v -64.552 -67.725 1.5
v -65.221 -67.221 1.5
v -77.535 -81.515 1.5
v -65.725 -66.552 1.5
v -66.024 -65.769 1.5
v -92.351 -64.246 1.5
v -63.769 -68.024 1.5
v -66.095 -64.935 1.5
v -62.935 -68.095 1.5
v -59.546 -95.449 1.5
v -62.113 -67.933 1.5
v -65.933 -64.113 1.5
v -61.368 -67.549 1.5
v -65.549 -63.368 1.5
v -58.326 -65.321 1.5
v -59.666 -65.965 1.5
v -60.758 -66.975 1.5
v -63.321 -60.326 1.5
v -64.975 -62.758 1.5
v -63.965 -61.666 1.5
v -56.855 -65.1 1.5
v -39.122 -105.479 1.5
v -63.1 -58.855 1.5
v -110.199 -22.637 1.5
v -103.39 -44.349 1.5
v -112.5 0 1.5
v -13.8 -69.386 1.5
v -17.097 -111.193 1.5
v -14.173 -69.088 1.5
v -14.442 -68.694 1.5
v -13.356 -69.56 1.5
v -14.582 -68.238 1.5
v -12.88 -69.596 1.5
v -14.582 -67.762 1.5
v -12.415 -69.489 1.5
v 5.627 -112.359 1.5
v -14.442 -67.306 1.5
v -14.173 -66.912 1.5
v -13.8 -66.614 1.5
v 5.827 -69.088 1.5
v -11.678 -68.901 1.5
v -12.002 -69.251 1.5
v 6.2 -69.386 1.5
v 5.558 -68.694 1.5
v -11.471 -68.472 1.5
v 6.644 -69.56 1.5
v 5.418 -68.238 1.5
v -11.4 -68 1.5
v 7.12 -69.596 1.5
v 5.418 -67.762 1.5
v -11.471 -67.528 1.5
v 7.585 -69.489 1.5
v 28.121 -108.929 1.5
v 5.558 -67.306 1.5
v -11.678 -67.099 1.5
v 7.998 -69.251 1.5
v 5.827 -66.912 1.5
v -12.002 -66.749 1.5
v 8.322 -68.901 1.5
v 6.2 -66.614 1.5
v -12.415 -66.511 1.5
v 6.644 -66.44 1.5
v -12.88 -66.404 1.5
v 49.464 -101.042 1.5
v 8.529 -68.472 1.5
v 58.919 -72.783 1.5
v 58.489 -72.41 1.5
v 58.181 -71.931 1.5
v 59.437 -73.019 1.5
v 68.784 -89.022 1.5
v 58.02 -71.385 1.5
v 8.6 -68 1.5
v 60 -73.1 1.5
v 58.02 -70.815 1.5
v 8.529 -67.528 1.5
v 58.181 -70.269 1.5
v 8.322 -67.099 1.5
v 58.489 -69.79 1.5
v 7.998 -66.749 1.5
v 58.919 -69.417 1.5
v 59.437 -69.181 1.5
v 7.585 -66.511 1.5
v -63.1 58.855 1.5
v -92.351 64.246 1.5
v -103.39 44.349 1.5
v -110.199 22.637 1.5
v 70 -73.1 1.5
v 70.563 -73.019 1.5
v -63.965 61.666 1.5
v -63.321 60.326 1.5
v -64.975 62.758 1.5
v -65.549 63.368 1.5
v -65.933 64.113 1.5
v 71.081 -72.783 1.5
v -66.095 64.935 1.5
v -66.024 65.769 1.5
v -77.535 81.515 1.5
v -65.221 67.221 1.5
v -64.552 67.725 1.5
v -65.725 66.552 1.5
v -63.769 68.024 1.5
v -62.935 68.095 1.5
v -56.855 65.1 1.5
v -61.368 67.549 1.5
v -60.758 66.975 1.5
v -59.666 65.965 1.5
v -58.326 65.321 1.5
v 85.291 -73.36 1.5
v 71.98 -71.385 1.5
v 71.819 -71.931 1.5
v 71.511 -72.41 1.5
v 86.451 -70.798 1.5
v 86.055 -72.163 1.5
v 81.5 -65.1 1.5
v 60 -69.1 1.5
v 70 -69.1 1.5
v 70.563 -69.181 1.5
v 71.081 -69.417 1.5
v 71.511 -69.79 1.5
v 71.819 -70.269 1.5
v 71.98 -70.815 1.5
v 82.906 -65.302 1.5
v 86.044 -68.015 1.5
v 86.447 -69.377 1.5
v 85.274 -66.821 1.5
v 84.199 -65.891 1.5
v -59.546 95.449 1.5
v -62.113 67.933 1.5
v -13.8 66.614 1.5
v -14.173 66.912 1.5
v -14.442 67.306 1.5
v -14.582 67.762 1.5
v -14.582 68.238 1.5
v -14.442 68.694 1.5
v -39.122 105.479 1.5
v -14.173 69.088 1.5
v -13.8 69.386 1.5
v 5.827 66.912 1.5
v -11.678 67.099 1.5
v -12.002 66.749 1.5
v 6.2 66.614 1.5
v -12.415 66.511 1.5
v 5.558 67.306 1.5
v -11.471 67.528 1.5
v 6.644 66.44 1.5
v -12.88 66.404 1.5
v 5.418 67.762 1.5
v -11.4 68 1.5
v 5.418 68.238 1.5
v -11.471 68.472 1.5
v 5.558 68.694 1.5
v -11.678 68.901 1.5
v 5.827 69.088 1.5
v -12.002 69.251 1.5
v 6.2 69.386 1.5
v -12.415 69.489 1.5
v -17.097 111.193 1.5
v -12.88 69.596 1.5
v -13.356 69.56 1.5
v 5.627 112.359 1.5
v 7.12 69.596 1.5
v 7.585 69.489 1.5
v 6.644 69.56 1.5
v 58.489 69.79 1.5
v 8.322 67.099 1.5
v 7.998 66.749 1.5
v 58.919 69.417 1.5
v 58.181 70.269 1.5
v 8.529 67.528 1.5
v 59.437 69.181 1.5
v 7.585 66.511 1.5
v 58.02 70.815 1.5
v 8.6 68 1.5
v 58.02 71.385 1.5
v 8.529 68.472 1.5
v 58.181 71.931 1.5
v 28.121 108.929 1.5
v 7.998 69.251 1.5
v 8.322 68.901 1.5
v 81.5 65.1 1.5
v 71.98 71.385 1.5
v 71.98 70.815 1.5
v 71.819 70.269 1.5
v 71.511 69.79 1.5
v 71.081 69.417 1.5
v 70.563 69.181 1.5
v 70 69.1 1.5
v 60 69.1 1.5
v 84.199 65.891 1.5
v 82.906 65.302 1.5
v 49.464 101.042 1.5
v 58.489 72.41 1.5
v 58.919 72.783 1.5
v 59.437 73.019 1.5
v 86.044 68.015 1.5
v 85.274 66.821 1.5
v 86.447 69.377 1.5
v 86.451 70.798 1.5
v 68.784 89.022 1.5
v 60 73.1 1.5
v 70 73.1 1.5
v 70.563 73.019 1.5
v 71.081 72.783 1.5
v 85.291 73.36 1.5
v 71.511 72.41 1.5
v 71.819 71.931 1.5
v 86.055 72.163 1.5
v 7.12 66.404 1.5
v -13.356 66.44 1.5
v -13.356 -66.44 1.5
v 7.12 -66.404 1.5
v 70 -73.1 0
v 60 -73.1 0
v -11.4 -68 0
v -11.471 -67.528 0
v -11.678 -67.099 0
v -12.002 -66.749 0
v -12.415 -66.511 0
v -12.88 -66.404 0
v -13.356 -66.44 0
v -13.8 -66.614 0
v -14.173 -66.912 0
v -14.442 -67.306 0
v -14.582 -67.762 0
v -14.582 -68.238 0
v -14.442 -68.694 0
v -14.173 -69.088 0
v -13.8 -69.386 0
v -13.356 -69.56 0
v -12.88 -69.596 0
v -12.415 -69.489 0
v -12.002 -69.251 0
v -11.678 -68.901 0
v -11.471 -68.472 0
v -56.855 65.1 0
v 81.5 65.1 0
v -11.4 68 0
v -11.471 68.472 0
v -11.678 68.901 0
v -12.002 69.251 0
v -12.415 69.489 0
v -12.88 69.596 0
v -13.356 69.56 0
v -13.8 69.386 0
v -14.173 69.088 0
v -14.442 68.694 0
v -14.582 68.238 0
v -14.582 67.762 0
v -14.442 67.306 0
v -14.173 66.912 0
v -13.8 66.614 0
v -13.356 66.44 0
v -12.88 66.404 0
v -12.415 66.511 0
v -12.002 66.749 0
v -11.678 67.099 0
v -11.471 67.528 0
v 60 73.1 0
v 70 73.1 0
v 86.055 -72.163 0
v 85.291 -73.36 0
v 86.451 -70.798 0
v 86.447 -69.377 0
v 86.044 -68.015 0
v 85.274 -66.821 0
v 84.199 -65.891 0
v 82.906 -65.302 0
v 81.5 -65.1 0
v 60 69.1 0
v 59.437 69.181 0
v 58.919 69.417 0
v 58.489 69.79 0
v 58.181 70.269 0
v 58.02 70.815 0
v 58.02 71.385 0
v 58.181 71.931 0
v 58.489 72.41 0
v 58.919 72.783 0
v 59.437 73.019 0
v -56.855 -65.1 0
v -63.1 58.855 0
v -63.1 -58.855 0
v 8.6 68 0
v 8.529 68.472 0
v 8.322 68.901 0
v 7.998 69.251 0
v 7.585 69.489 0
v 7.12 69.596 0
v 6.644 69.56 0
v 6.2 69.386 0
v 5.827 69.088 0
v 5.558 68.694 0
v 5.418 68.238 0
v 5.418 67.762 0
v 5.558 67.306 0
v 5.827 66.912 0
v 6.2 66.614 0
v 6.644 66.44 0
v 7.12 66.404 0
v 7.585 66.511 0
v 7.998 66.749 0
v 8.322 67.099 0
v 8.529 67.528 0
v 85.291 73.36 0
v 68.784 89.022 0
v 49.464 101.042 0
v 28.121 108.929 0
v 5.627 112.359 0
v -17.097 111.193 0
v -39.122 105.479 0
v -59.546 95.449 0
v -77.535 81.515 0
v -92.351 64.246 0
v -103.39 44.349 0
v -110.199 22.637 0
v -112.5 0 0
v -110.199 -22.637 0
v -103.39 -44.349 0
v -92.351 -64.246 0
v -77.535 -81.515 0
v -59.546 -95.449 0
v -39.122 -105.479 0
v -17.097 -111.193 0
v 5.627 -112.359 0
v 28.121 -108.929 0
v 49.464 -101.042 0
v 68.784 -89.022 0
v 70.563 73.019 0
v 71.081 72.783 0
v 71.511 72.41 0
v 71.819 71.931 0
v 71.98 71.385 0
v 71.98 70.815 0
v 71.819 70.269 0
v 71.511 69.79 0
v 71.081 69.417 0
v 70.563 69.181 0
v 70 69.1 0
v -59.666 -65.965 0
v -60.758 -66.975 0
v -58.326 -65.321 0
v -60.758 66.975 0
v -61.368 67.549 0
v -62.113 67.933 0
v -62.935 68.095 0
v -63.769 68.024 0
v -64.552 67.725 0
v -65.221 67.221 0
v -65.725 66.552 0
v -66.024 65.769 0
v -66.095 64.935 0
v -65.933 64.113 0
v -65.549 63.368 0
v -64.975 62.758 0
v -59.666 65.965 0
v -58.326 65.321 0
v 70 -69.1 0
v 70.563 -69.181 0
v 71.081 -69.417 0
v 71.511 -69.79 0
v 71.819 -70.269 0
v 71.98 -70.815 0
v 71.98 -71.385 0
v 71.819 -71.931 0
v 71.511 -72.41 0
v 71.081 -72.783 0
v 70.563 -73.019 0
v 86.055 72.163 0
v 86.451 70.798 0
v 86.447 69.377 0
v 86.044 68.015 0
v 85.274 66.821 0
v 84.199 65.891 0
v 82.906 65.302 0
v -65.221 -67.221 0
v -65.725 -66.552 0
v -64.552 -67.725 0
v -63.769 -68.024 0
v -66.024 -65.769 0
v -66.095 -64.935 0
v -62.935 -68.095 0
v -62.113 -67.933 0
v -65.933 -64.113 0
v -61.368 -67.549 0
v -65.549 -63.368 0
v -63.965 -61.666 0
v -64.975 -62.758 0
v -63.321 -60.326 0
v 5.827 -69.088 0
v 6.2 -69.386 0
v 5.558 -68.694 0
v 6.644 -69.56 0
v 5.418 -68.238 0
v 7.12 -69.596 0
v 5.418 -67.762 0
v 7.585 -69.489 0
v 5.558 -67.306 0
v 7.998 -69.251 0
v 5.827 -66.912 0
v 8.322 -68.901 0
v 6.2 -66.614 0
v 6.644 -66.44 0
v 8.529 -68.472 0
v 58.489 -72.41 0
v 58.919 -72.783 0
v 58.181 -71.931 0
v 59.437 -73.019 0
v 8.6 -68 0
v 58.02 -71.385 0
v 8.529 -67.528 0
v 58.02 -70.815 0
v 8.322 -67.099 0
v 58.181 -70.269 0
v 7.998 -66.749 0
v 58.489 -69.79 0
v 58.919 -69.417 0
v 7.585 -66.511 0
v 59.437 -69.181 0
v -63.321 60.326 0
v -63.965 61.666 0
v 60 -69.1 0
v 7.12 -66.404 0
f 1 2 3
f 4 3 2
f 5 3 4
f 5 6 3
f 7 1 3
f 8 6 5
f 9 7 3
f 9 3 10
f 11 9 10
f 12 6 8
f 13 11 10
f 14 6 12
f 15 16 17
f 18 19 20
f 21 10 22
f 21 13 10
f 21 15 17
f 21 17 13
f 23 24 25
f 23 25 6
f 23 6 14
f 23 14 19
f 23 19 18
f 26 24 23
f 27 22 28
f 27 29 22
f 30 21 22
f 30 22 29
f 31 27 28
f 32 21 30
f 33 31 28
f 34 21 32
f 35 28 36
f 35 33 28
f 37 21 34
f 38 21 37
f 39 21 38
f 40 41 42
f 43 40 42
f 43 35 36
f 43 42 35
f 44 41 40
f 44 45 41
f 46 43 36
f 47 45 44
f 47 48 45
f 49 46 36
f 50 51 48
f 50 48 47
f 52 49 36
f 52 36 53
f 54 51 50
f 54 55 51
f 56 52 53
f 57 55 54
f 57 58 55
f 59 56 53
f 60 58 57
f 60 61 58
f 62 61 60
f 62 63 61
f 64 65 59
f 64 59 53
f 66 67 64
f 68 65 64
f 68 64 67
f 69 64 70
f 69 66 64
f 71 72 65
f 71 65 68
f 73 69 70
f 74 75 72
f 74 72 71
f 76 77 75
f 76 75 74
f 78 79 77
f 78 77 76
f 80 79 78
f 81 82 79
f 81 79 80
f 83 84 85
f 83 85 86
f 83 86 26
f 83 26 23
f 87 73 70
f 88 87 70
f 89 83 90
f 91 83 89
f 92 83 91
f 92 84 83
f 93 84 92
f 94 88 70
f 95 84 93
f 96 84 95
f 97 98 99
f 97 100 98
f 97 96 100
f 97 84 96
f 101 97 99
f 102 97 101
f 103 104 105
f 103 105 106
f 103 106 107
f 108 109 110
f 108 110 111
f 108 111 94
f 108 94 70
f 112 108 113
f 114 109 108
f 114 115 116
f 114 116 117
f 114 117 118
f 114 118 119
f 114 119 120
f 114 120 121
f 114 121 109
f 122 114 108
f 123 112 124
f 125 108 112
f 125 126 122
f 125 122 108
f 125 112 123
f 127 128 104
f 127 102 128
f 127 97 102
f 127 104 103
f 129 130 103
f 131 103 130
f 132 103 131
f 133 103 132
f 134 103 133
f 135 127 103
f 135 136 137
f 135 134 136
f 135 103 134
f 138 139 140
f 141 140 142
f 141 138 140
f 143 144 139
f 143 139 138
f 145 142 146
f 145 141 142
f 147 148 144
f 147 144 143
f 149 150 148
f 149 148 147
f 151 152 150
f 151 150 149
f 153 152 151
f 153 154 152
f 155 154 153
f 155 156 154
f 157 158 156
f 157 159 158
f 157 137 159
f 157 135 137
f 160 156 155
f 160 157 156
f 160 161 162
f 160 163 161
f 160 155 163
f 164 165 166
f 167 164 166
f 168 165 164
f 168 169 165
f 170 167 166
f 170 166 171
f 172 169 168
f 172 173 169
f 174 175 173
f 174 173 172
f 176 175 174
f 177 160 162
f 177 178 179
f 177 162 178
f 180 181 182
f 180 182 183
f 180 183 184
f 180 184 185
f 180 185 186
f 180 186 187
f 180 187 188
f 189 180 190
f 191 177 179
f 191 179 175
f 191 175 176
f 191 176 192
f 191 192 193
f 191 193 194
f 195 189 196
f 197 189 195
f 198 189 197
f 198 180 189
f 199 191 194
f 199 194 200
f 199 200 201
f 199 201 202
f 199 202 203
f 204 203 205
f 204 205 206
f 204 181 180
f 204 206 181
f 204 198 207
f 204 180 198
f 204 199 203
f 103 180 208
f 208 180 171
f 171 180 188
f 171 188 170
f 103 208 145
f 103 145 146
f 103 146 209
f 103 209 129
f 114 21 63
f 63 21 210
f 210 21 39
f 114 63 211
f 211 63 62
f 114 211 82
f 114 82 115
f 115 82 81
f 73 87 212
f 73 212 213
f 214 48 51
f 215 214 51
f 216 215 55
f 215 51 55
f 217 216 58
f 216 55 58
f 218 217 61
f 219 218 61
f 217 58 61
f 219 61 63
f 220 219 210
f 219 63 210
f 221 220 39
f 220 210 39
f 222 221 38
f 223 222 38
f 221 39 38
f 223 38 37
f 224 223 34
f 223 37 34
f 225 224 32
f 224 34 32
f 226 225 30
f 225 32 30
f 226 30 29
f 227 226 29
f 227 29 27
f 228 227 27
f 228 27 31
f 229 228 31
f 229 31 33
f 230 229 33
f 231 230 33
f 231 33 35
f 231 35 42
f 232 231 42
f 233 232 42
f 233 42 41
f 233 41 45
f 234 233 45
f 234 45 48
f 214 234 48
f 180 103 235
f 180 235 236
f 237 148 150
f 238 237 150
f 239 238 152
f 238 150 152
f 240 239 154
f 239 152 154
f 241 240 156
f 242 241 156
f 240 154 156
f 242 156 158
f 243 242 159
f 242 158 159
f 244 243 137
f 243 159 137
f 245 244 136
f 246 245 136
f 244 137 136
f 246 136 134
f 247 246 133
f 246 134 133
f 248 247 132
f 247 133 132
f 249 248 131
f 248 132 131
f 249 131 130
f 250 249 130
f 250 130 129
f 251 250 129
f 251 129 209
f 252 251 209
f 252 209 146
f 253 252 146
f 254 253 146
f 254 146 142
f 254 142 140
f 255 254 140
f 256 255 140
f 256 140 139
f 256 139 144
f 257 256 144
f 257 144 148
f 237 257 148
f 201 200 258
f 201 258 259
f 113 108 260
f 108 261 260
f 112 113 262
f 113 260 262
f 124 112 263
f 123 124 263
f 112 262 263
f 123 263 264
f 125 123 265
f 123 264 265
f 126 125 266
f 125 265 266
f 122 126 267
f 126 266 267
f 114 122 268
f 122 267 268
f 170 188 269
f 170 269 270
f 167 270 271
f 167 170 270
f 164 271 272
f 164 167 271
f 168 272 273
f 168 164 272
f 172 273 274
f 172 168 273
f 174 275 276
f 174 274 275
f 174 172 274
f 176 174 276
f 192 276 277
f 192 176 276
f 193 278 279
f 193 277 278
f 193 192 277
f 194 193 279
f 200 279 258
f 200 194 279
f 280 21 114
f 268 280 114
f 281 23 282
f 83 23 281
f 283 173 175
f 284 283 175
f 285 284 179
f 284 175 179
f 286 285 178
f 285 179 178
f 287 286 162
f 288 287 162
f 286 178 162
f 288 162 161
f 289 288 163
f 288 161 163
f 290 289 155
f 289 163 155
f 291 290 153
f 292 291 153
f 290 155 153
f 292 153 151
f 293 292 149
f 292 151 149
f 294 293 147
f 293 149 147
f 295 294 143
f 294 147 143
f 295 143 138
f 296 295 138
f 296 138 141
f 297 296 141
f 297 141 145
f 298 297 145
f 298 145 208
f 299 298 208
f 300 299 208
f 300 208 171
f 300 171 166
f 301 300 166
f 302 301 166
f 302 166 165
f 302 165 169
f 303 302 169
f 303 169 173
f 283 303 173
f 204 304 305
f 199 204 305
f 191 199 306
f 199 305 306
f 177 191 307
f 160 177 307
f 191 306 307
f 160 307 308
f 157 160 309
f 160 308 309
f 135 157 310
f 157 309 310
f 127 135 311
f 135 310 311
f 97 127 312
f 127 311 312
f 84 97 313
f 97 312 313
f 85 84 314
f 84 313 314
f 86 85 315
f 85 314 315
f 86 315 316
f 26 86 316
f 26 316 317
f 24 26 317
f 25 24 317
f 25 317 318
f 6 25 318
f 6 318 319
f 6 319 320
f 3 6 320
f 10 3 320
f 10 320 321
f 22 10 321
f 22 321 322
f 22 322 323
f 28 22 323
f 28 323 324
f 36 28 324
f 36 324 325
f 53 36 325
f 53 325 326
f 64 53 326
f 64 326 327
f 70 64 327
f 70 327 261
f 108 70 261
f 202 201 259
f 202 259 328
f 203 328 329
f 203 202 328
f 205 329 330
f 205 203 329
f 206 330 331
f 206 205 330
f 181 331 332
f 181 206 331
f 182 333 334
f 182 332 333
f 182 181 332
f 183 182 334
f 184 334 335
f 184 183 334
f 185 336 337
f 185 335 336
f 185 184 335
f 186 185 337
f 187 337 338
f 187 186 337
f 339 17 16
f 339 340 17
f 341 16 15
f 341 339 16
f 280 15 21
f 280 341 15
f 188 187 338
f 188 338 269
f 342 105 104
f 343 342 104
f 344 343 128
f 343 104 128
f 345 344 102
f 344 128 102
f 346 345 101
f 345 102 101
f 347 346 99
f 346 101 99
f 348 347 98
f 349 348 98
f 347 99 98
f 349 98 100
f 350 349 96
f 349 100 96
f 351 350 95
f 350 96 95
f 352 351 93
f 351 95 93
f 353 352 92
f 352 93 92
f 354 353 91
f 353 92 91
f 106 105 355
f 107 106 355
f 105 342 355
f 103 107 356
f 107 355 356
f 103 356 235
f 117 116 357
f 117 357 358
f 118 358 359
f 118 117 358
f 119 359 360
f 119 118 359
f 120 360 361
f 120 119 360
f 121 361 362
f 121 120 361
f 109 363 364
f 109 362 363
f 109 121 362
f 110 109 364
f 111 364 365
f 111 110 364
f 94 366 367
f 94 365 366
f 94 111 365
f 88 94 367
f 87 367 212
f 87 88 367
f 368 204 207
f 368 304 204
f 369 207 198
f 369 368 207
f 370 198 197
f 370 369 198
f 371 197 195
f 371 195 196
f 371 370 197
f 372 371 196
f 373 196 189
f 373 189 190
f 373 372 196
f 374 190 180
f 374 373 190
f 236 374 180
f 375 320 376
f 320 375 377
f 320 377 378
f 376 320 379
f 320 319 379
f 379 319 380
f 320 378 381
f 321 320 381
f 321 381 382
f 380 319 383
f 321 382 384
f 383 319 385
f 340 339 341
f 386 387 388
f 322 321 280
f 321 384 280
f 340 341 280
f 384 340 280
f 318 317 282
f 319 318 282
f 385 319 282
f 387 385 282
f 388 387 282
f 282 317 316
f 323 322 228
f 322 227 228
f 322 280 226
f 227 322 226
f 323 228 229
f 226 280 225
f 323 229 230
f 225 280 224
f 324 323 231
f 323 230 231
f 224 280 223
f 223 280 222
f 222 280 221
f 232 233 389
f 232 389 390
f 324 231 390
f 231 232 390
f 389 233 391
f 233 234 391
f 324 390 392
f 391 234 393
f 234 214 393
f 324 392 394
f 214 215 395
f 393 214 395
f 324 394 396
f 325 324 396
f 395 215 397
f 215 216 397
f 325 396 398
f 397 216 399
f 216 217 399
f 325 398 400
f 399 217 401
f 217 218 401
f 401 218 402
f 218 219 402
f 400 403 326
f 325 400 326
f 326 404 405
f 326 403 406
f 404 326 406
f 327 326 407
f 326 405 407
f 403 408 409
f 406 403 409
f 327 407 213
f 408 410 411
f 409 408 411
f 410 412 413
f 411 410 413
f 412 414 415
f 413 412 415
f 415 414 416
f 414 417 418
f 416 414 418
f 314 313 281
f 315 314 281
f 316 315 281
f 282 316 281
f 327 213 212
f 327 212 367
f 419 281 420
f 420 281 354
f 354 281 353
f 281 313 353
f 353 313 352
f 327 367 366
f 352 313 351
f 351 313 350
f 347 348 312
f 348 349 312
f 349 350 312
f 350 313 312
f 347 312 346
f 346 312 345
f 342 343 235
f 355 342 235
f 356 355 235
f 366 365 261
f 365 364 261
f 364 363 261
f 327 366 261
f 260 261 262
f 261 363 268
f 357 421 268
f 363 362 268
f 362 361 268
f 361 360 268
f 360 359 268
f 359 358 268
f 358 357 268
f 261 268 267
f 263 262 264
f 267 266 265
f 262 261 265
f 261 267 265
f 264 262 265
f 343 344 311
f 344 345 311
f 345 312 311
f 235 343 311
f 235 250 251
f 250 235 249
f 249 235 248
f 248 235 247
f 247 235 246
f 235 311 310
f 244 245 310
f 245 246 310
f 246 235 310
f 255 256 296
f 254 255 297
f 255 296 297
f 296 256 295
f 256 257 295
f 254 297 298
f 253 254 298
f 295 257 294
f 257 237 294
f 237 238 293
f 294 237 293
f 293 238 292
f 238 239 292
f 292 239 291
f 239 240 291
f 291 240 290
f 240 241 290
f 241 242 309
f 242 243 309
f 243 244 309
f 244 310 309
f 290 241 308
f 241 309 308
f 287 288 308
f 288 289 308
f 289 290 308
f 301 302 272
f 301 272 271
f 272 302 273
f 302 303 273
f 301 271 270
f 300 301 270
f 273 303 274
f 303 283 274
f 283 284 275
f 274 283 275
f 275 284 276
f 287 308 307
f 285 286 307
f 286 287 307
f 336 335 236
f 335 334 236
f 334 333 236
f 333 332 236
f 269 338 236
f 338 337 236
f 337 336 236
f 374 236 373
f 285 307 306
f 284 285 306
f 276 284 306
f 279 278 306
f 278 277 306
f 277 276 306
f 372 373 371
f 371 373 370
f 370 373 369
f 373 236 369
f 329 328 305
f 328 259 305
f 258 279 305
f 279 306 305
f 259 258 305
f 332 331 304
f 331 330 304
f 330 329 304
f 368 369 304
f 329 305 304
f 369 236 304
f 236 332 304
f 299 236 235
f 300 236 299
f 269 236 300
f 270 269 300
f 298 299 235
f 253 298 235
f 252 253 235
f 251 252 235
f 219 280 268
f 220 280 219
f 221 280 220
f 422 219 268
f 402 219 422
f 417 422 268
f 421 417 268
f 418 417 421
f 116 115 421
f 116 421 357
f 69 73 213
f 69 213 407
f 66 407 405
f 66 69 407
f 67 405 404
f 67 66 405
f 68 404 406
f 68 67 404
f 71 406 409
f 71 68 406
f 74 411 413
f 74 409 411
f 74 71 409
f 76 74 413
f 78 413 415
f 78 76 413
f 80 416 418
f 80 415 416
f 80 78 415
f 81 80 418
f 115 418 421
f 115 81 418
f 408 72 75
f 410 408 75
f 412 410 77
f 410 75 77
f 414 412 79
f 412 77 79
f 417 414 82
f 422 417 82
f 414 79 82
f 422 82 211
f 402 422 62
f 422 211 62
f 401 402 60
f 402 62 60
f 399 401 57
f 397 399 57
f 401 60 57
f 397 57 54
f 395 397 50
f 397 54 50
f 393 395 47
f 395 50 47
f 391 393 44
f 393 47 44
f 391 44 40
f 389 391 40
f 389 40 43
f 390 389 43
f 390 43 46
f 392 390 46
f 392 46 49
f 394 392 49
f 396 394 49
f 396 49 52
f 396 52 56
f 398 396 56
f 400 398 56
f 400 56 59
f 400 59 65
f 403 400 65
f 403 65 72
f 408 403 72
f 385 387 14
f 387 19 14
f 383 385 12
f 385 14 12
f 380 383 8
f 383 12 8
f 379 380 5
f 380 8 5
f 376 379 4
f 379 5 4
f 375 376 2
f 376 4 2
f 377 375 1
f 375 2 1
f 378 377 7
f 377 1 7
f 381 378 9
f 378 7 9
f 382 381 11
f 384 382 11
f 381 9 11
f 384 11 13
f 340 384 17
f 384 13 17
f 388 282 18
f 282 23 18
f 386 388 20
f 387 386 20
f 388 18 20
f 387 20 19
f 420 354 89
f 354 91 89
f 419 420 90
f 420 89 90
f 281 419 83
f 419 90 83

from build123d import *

# Parameters (mm, degrees)
SKETCH_1_R          = 112.5
EXTRUDE_1_DEPTH     = 1.5
SKETCH_2_R          = 1.6
SKETCH_2_W          = 175.6
SKETCH_2_H          = 130.2
CUT_EXTRUDE_1_DEPTH = 10
FILLET_1_R          = 5
SKETCH_3_R          = 3
CUT_EXTRUDE_2_DEPTH = 10
FILLET_2_R          = 5
CUT_EXTRUDE_3_DEPTH = 10


with BuildPart() as part:
    # 草图1 → 凸台-拉伸1 (new body)
    with BuildSketch(Plane.XY):
        Circle(SKETCH_1_R)
    extrude(amount=EXTRUDE_1_DEPTH)

    # 草图2 → 切除-拉伸1 (cut)
    with BuildSketch(Plane.XY.offset(1.5)):
        with Locations((-13, 68)):
            Circle(SKETCH_2_R)
        with Locations((7, 68)):
            Circle(SKETCH_2_R)
        with Locations((-13, -68)):
            Circle(SKETCH_2_R)
        with Locations((7, -68)):
            Circle(SKETCH_2_R)
        with Locations((24.7, 0)):
            Rectangle(SKETCH_2_W, SKETCH_2_H)
    extrude(amount=-CUT_EXTRUDE_1_DEPTH, mode=Mode.SUBTRACT)

    # 圆角1
    fillet_1_edges = [part.edges().sort_by_distance(p)[0] for p in [
        (91.750967297, 65.1, 0.75),
        (91.750967297, -65.1, 0.75),
    ]]
    fillet(fillet_1_edges, radius=FILLET_1_R)

    # 草图3 → 切除-拉伸2 (cut)
    with BuildSketch(Plane.XY.offset(1.5)):
        with Locations((-63.1, 65.1)):
            Circle(SKETCH_3_R)
        with Locations((-63.1, -65.1)):
            Circle(SKETCH_3_R)
    extrude(amount=-CUT_EXTRUDE_2_DEPTH, mode=Mode.SUBTRACT)

    # 圆角2
    fillet_2_edges = [part.edges().sort_by_distance(p)[0] for p in [
        (-60.1, -65.1, 0.75),
        (-60.1, 65.1, 0.75),
        (-63.1, 62.1, 0.75),
        (-63.1, -62.1, 0.75),
    ]]
    fillet(fillet_2_edges, radius=FILLET_2_R)

    # 草图4 → 切除-拉伸3 (cut)
    with BuildSketch(Plane.XY.offset(1.5)):
        with BuildLine():
            Line((60, 73.1), (70, 73.1))
            ThreePointArc((70, 73.1), (72, 71.1), (70, 69.1))
            Line((70, 69.1), (60, 69.1))
            ThreePointArc((60, 69.1), (58, 71.1), (60, 73.1))
        make_face()
        with BuildLine():
            Line((60, -69.1), (70, -69.1))
            ThreePointArc((70, -69.1), (72, -71.1), (70, -73.1))
            Line((70, -73.1), (60, -73.1))
            ThreePointArc((60, -73.1), (58, -71.1), (60, -69.1))
        make_face()
    extrude(amount=-CUT_EXTRUDE_3_DEPTH, mode=Mode.SUBTRACT)


solid = part.part
